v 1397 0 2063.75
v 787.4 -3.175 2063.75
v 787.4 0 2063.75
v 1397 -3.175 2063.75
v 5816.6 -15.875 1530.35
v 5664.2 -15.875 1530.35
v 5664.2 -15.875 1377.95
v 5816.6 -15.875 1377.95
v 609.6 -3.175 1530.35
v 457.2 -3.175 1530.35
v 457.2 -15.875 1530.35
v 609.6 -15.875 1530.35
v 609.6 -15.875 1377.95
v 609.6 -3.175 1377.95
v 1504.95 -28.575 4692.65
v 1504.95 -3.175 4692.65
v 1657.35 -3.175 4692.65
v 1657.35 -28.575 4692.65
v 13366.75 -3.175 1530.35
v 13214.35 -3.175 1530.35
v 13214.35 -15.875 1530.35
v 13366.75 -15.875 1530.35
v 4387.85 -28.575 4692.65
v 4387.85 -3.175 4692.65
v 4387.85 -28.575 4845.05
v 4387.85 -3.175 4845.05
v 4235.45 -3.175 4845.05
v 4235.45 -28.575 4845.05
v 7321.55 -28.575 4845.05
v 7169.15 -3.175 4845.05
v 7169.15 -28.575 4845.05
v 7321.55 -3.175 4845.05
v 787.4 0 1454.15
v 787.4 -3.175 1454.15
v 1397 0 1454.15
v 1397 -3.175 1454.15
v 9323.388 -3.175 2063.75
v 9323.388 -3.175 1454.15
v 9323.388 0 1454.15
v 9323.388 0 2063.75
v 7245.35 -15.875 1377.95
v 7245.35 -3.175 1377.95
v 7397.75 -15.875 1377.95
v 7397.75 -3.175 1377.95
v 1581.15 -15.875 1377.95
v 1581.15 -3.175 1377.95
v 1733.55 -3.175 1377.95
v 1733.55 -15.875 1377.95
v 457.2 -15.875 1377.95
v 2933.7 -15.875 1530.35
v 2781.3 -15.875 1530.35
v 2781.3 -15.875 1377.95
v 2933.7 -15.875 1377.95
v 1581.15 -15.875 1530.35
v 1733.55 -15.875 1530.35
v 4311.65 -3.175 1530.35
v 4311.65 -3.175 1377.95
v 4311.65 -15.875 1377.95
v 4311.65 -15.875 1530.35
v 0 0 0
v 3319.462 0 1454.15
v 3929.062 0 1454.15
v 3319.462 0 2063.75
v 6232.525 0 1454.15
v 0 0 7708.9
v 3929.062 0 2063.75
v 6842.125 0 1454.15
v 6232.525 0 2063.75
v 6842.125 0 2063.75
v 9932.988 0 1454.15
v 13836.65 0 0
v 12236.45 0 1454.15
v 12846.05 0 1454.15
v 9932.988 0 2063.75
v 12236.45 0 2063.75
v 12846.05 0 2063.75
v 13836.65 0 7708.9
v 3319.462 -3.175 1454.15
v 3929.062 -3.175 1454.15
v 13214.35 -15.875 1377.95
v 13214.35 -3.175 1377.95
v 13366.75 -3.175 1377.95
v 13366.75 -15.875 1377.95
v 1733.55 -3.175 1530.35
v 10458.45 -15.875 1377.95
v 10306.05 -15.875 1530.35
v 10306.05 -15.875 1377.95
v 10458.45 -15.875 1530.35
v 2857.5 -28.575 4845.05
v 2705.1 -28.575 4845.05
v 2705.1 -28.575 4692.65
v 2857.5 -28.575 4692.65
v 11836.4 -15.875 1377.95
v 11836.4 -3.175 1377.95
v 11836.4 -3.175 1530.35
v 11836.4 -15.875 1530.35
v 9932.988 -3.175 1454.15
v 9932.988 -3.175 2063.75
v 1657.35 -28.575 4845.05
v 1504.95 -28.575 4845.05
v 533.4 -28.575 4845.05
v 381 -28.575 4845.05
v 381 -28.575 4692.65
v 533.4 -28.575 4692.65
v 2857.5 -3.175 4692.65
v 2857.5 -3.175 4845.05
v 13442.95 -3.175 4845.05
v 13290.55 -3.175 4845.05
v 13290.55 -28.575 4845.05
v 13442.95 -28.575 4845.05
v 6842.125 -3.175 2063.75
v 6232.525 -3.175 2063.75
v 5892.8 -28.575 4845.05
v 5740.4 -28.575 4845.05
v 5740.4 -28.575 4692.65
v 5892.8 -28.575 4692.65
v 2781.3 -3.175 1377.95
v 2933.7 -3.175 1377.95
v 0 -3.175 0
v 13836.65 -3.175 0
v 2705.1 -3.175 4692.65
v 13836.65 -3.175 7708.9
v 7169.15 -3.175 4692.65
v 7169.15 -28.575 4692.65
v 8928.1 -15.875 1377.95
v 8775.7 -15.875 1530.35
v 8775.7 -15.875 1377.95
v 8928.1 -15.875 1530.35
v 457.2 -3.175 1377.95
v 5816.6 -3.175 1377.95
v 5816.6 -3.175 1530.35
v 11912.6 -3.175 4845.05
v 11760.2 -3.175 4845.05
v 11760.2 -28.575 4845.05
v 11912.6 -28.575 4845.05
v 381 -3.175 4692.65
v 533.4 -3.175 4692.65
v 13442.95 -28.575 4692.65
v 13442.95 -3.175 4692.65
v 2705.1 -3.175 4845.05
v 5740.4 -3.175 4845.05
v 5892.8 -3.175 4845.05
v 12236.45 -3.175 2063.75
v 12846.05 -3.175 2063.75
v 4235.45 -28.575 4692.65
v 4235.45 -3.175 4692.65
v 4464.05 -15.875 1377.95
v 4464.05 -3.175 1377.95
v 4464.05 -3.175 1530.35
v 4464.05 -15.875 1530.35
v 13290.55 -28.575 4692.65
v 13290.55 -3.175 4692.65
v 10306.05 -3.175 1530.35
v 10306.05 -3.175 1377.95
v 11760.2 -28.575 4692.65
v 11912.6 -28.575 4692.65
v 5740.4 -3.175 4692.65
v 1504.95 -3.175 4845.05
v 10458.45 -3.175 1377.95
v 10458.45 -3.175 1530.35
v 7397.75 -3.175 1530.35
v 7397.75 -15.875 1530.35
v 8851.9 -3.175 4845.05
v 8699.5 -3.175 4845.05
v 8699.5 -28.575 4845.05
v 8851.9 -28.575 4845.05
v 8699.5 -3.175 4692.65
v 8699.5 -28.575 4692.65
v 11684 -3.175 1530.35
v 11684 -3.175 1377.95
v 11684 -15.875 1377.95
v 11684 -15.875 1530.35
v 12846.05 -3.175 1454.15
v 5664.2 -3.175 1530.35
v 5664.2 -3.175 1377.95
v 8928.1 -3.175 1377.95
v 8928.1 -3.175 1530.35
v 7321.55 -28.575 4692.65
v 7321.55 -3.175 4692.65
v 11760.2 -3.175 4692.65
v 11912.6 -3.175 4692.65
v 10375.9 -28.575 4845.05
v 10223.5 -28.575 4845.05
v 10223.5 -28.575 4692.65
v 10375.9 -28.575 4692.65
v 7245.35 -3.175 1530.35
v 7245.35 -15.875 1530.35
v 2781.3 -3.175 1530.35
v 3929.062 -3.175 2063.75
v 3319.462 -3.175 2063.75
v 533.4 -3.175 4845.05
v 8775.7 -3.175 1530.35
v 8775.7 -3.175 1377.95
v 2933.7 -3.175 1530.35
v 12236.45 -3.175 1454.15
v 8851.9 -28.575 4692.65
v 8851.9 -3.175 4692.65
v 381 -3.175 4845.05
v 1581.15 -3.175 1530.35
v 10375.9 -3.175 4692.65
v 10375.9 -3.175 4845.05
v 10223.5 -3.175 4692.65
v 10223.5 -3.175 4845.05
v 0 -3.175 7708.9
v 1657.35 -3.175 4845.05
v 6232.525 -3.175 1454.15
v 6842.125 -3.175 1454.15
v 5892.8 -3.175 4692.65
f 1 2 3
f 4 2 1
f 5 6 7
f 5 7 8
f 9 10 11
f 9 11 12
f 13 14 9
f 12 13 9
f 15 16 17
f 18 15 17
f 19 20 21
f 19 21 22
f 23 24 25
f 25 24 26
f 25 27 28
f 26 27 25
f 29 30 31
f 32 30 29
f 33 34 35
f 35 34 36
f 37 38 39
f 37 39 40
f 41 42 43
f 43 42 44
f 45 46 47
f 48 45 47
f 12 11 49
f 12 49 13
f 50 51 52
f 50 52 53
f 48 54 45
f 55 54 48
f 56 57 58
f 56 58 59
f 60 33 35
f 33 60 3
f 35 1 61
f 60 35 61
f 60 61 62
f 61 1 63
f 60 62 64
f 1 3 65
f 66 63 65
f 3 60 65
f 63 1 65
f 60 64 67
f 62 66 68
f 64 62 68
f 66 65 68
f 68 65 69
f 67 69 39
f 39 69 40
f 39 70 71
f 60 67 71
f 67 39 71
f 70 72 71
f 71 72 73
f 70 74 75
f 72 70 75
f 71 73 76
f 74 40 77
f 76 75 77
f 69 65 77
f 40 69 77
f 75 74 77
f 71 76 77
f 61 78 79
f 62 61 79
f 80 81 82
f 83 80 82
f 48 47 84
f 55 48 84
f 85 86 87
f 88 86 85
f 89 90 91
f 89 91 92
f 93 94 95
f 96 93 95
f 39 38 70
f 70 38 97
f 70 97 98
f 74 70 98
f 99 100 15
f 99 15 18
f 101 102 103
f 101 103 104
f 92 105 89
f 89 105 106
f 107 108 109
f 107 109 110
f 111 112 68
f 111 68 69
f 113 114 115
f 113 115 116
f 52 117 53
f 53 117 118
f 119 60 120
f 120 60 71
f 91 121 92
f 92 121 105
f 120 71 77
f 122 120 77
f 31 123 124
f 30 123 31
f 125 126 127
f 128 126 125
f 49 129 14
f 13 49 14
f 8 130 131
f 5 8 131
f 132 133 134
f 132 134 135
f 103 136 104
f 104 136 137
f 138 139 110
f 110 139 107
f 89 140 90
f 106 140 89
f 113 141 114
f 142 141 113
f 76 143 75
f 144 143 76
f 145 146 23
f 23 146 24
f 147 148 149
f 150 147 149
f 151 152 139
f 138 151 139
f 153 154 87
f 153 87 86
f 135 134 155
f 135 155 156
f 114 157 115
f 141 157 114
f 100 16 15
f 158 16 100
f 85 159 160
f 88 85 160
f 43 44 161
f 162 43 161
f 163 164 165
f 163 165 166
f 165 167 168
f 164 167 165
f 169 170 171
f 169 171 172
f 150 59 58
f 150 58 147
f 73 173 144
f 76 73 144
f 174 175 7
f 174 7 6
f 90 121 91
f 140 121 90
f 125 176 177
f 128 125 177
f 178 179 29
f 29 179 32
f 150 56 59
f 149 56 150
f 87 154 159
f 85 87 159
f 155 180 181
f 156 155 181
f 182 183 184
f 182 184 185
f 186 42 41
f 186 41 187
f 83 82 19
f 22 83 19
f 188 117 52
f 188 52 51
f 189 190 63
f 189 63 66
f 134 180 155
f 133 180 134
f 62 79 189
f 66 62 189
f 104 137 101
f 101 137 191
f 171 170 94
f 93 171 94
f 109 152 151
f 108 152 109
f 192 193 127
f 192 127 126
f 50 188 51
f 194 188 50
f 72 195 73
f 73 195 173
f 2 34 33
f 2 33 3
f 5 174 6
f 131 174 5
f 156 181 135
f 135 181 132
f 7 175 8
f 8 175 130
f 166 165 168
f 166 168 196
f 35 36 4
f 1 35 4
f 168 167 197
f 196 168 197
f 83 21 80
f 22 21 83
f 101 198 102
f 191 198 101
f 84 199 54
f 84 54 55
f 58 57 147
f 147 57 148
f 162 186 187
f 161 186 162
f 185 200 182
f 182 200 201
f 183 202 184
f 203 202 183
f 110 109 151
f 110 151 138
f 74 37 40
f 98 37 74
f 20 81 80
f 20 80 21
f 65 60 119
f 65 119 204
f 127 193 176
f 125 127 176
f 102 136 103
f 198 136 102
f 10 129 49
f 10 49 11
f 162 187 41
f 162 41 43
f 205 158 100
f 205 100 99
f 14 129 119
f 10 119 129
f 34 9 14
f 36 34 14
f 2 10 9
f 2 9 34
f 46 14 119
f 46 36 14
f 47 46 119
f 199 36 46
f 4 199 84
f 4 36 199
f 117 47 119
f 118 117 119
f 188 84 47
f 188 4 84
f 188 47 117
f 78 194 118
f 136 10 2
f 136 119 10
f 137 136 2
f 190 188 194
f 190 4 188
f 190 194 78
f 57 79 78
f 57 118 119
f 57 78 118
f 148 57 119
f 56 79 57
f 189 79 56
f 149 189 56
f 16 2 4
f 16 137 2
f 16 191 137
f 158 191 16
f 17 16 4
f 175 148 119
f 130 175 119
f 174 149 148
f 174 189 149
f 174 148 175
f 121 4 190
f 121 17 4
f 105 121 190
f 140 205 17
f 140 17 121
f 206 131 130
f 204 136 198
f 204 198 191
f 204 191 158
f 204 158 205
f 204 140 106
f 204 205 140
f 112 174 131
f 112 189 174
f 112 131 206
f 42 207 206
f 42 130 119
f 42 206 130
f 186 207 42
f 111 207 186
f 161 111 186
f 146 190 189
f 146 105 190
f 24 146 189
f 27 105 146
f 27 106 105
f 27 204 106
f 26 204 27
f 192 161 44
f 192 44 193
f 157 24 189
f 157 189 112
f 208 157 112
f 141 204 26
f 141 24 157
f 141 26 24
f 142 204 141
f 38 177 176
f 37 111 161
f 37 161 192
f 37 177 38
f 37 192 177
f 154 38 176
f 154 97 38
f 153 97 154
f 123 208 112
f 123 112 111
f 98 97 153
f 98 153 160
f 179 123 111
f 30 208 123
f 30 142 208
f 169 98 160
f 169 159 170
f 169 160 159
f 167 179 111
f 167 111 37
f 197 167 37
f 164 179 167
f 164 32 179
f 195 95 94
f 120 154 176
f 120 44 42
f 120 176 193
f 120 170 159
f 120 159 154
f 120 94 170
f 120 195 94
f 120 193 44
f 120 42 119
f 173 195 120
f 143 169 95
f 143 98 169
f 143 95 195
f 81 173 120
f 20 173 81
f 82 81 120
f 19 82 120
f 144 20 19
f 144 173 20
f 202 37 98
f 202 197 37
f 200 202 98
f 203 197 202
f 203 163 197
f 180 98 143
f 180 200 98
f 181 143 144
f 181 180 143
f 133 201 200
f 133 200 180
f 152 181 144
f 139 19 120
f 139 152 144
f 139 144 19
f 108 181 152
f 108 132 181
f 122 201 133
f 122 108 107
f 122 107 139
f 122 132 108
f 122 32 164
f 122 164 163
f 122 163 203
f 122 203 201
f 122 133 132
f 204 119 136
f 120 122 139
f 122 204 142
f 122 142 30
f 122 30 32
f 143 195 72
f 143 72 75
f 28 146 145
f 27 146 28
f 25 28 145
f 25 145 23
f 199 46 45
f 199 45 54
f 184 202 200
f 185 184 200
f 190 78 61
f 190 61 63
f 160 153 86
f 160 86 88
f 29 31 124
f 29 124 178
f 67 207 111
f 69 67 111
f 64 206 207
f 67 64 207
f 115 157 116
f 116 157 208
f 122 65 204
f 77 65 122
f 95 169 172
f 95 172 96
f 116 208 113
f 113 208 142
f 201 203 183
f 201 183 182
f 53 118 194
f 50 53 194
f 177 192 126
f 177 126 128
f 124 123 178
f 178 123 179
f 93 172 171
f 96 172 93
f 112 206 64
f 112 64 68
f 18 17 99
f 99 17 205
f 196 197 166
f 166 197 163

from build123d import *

# Parameters (mm, degrees)
F0_W     = 13836.65
F0_H     = 7708.9
F1_DEPTH = 3.175
F2_W     = 609.6
F2_H     = 609.6
F3_DEPTH = 3.176
F4_W     = 152.4
F4_H     = 152.4
F5_DEPTH = 6.35
F6_DEPTH = 12.7
F7_W     = 152.4
F7_H     = 152.4
F8_DEPTH = 25.4


with BuildPart() as f1:
    # F0 (on Front) → F1 (new body)
    with BuildSketch(Plane.XZ):
        with Locations((6918.325, 3854.45)):
            Rectangle(F0_W, F0_H)
    extrude(amount=F1_DEPTH)

    # F2 (on face) → F3 (cut, through all)
    with BuildSketch(Plane.XZ.offset(3.175)):
        with Locations((1092.2, 1758.95)):
            Rectangle(F2_W, F2_H)
        with Locations((3624.2625, 1758.95)):
            Rectangle(F2_W, F2_H)
        with Locations((6537.325, 1758.95)):
            Rectangle(F2_W, F2_H)
        with Locations((9628.1875, 1758.95)):
            Rectangle(F2_W, F2_H)
        with Locations((12541.25, 1758.95)):
            Rectangle(F2_W, F2_H)
    extrude(amount=-F3_DEPTH, mode=Mode.SUBTRACT)

    # F4 (on face) → F5 (join)
    with BuildSketch(Plane.XZ.offset(3.175)):
        with Locations((533.4, 1454.15)):
            Rectangle(F4_W, F4_H)
        with Locations((1657.35, 1454.15)):
            Rectangle(F4_W, F4_H)
        with Locations((2857.5, 1454.15)):
            Rectangle(F4_W, F4_H)
        with Locations((4387.85, 1454.15)):
            Rectangle(F4_W, F4_H)
        with Locations((5740.4, 1454.15)):
            Rectangle(F4_W, F4_H)
        with Locations((7321.55, 1454.15)):
            Rectangle(F4_W, F4_H)
        with Locations((8851.9, 1454.15)):
            Rectangle(F4_W, F4_H)
        with Locations((10382.25, 1454.15)):
            Rectangle(F4_W, F4_H)
        with Locations((11760.2, 1454.15)):
            Rectangle(F4_W, F4_H)
        with Locations((13290.55, 1454.15)):
            Rectangle(F4_W, F4_H)
    extrude(amount=F5_DEPTH)

    # F4 (on face) → F6 (join)
    with BuildSketch(Plane.XZ.offset(3.175)):
        with Locations((533.4, 1454.15)):
            Rectangle(F4_W, F4_H)
        with Locations((1657.35, 1454.15)):
            Rectangle(F4_W, F4_H)
        with Locations((2857.5, 1454.15)):
            Rectangle(F4_W, F4_H)
        with Locations((4387.85, 1454.15)):
            Rectangle(F4_W, F4_H)
        with Locations((5740.4, 1454.15)):
            Rectangle(F4_W, F4_H)
        with Locations((7321.55, 1454.15)):
            Rectangle(F4_W, F4_H)
        with Locations((8851.9, 1454.15)):
            Rectangle(F4_W, F4_H)
        with Locations((10382.25, 1454.15)):
            Rectangle(F4_W, F4_H)
        with Locations((11760.2, 1454.15)):
            Rectangle(F4_W, F4_H)
        with Locations((13290.55, 1454.15)):
            Rectangle(F4_W, F4_H)
    extrude(amount=F6_DEPTH)

    # F7 (on face) → F8 (join)
    with BuildSketch(Plane.XZ.offset(3.175)):
        with Locations((457.2, 4768.85)):
            Rectangle(F7_W, F7_H)
        with Locations((1581.15, 4768.85)):
            Rectangle(F7_W, F7_H)
        with Locations((2781.3, 4768.85)):
            Rectangle(F7_W, F7_H)
        with Locations((4311.65, 4768.85)):
            Rectangle(F7_W, F7_H)
        with Locations((5816.6, 4768.85)):
            Rectangle(F7_W, F7_H)
        with Locations((7245.35, 4768.85)):
            Rectangle(F7_W, F7_H)
        with Locations((8775.7, 4768.85)):
            Rectangle(F7_W, F7_H)
        with Locations((10299.7, 4768.85)):
            Rectangle(F7_W, F7_H)
        with Locations((11836.4, 4768.85)):
            Rectangle(F7_W, F7_H)
        with Locations((13366.75, 4768.85)):
            Rectangle(F7_W, F7_H)
    extrude(amount=F8_DEPTH)


solid = f1.part
